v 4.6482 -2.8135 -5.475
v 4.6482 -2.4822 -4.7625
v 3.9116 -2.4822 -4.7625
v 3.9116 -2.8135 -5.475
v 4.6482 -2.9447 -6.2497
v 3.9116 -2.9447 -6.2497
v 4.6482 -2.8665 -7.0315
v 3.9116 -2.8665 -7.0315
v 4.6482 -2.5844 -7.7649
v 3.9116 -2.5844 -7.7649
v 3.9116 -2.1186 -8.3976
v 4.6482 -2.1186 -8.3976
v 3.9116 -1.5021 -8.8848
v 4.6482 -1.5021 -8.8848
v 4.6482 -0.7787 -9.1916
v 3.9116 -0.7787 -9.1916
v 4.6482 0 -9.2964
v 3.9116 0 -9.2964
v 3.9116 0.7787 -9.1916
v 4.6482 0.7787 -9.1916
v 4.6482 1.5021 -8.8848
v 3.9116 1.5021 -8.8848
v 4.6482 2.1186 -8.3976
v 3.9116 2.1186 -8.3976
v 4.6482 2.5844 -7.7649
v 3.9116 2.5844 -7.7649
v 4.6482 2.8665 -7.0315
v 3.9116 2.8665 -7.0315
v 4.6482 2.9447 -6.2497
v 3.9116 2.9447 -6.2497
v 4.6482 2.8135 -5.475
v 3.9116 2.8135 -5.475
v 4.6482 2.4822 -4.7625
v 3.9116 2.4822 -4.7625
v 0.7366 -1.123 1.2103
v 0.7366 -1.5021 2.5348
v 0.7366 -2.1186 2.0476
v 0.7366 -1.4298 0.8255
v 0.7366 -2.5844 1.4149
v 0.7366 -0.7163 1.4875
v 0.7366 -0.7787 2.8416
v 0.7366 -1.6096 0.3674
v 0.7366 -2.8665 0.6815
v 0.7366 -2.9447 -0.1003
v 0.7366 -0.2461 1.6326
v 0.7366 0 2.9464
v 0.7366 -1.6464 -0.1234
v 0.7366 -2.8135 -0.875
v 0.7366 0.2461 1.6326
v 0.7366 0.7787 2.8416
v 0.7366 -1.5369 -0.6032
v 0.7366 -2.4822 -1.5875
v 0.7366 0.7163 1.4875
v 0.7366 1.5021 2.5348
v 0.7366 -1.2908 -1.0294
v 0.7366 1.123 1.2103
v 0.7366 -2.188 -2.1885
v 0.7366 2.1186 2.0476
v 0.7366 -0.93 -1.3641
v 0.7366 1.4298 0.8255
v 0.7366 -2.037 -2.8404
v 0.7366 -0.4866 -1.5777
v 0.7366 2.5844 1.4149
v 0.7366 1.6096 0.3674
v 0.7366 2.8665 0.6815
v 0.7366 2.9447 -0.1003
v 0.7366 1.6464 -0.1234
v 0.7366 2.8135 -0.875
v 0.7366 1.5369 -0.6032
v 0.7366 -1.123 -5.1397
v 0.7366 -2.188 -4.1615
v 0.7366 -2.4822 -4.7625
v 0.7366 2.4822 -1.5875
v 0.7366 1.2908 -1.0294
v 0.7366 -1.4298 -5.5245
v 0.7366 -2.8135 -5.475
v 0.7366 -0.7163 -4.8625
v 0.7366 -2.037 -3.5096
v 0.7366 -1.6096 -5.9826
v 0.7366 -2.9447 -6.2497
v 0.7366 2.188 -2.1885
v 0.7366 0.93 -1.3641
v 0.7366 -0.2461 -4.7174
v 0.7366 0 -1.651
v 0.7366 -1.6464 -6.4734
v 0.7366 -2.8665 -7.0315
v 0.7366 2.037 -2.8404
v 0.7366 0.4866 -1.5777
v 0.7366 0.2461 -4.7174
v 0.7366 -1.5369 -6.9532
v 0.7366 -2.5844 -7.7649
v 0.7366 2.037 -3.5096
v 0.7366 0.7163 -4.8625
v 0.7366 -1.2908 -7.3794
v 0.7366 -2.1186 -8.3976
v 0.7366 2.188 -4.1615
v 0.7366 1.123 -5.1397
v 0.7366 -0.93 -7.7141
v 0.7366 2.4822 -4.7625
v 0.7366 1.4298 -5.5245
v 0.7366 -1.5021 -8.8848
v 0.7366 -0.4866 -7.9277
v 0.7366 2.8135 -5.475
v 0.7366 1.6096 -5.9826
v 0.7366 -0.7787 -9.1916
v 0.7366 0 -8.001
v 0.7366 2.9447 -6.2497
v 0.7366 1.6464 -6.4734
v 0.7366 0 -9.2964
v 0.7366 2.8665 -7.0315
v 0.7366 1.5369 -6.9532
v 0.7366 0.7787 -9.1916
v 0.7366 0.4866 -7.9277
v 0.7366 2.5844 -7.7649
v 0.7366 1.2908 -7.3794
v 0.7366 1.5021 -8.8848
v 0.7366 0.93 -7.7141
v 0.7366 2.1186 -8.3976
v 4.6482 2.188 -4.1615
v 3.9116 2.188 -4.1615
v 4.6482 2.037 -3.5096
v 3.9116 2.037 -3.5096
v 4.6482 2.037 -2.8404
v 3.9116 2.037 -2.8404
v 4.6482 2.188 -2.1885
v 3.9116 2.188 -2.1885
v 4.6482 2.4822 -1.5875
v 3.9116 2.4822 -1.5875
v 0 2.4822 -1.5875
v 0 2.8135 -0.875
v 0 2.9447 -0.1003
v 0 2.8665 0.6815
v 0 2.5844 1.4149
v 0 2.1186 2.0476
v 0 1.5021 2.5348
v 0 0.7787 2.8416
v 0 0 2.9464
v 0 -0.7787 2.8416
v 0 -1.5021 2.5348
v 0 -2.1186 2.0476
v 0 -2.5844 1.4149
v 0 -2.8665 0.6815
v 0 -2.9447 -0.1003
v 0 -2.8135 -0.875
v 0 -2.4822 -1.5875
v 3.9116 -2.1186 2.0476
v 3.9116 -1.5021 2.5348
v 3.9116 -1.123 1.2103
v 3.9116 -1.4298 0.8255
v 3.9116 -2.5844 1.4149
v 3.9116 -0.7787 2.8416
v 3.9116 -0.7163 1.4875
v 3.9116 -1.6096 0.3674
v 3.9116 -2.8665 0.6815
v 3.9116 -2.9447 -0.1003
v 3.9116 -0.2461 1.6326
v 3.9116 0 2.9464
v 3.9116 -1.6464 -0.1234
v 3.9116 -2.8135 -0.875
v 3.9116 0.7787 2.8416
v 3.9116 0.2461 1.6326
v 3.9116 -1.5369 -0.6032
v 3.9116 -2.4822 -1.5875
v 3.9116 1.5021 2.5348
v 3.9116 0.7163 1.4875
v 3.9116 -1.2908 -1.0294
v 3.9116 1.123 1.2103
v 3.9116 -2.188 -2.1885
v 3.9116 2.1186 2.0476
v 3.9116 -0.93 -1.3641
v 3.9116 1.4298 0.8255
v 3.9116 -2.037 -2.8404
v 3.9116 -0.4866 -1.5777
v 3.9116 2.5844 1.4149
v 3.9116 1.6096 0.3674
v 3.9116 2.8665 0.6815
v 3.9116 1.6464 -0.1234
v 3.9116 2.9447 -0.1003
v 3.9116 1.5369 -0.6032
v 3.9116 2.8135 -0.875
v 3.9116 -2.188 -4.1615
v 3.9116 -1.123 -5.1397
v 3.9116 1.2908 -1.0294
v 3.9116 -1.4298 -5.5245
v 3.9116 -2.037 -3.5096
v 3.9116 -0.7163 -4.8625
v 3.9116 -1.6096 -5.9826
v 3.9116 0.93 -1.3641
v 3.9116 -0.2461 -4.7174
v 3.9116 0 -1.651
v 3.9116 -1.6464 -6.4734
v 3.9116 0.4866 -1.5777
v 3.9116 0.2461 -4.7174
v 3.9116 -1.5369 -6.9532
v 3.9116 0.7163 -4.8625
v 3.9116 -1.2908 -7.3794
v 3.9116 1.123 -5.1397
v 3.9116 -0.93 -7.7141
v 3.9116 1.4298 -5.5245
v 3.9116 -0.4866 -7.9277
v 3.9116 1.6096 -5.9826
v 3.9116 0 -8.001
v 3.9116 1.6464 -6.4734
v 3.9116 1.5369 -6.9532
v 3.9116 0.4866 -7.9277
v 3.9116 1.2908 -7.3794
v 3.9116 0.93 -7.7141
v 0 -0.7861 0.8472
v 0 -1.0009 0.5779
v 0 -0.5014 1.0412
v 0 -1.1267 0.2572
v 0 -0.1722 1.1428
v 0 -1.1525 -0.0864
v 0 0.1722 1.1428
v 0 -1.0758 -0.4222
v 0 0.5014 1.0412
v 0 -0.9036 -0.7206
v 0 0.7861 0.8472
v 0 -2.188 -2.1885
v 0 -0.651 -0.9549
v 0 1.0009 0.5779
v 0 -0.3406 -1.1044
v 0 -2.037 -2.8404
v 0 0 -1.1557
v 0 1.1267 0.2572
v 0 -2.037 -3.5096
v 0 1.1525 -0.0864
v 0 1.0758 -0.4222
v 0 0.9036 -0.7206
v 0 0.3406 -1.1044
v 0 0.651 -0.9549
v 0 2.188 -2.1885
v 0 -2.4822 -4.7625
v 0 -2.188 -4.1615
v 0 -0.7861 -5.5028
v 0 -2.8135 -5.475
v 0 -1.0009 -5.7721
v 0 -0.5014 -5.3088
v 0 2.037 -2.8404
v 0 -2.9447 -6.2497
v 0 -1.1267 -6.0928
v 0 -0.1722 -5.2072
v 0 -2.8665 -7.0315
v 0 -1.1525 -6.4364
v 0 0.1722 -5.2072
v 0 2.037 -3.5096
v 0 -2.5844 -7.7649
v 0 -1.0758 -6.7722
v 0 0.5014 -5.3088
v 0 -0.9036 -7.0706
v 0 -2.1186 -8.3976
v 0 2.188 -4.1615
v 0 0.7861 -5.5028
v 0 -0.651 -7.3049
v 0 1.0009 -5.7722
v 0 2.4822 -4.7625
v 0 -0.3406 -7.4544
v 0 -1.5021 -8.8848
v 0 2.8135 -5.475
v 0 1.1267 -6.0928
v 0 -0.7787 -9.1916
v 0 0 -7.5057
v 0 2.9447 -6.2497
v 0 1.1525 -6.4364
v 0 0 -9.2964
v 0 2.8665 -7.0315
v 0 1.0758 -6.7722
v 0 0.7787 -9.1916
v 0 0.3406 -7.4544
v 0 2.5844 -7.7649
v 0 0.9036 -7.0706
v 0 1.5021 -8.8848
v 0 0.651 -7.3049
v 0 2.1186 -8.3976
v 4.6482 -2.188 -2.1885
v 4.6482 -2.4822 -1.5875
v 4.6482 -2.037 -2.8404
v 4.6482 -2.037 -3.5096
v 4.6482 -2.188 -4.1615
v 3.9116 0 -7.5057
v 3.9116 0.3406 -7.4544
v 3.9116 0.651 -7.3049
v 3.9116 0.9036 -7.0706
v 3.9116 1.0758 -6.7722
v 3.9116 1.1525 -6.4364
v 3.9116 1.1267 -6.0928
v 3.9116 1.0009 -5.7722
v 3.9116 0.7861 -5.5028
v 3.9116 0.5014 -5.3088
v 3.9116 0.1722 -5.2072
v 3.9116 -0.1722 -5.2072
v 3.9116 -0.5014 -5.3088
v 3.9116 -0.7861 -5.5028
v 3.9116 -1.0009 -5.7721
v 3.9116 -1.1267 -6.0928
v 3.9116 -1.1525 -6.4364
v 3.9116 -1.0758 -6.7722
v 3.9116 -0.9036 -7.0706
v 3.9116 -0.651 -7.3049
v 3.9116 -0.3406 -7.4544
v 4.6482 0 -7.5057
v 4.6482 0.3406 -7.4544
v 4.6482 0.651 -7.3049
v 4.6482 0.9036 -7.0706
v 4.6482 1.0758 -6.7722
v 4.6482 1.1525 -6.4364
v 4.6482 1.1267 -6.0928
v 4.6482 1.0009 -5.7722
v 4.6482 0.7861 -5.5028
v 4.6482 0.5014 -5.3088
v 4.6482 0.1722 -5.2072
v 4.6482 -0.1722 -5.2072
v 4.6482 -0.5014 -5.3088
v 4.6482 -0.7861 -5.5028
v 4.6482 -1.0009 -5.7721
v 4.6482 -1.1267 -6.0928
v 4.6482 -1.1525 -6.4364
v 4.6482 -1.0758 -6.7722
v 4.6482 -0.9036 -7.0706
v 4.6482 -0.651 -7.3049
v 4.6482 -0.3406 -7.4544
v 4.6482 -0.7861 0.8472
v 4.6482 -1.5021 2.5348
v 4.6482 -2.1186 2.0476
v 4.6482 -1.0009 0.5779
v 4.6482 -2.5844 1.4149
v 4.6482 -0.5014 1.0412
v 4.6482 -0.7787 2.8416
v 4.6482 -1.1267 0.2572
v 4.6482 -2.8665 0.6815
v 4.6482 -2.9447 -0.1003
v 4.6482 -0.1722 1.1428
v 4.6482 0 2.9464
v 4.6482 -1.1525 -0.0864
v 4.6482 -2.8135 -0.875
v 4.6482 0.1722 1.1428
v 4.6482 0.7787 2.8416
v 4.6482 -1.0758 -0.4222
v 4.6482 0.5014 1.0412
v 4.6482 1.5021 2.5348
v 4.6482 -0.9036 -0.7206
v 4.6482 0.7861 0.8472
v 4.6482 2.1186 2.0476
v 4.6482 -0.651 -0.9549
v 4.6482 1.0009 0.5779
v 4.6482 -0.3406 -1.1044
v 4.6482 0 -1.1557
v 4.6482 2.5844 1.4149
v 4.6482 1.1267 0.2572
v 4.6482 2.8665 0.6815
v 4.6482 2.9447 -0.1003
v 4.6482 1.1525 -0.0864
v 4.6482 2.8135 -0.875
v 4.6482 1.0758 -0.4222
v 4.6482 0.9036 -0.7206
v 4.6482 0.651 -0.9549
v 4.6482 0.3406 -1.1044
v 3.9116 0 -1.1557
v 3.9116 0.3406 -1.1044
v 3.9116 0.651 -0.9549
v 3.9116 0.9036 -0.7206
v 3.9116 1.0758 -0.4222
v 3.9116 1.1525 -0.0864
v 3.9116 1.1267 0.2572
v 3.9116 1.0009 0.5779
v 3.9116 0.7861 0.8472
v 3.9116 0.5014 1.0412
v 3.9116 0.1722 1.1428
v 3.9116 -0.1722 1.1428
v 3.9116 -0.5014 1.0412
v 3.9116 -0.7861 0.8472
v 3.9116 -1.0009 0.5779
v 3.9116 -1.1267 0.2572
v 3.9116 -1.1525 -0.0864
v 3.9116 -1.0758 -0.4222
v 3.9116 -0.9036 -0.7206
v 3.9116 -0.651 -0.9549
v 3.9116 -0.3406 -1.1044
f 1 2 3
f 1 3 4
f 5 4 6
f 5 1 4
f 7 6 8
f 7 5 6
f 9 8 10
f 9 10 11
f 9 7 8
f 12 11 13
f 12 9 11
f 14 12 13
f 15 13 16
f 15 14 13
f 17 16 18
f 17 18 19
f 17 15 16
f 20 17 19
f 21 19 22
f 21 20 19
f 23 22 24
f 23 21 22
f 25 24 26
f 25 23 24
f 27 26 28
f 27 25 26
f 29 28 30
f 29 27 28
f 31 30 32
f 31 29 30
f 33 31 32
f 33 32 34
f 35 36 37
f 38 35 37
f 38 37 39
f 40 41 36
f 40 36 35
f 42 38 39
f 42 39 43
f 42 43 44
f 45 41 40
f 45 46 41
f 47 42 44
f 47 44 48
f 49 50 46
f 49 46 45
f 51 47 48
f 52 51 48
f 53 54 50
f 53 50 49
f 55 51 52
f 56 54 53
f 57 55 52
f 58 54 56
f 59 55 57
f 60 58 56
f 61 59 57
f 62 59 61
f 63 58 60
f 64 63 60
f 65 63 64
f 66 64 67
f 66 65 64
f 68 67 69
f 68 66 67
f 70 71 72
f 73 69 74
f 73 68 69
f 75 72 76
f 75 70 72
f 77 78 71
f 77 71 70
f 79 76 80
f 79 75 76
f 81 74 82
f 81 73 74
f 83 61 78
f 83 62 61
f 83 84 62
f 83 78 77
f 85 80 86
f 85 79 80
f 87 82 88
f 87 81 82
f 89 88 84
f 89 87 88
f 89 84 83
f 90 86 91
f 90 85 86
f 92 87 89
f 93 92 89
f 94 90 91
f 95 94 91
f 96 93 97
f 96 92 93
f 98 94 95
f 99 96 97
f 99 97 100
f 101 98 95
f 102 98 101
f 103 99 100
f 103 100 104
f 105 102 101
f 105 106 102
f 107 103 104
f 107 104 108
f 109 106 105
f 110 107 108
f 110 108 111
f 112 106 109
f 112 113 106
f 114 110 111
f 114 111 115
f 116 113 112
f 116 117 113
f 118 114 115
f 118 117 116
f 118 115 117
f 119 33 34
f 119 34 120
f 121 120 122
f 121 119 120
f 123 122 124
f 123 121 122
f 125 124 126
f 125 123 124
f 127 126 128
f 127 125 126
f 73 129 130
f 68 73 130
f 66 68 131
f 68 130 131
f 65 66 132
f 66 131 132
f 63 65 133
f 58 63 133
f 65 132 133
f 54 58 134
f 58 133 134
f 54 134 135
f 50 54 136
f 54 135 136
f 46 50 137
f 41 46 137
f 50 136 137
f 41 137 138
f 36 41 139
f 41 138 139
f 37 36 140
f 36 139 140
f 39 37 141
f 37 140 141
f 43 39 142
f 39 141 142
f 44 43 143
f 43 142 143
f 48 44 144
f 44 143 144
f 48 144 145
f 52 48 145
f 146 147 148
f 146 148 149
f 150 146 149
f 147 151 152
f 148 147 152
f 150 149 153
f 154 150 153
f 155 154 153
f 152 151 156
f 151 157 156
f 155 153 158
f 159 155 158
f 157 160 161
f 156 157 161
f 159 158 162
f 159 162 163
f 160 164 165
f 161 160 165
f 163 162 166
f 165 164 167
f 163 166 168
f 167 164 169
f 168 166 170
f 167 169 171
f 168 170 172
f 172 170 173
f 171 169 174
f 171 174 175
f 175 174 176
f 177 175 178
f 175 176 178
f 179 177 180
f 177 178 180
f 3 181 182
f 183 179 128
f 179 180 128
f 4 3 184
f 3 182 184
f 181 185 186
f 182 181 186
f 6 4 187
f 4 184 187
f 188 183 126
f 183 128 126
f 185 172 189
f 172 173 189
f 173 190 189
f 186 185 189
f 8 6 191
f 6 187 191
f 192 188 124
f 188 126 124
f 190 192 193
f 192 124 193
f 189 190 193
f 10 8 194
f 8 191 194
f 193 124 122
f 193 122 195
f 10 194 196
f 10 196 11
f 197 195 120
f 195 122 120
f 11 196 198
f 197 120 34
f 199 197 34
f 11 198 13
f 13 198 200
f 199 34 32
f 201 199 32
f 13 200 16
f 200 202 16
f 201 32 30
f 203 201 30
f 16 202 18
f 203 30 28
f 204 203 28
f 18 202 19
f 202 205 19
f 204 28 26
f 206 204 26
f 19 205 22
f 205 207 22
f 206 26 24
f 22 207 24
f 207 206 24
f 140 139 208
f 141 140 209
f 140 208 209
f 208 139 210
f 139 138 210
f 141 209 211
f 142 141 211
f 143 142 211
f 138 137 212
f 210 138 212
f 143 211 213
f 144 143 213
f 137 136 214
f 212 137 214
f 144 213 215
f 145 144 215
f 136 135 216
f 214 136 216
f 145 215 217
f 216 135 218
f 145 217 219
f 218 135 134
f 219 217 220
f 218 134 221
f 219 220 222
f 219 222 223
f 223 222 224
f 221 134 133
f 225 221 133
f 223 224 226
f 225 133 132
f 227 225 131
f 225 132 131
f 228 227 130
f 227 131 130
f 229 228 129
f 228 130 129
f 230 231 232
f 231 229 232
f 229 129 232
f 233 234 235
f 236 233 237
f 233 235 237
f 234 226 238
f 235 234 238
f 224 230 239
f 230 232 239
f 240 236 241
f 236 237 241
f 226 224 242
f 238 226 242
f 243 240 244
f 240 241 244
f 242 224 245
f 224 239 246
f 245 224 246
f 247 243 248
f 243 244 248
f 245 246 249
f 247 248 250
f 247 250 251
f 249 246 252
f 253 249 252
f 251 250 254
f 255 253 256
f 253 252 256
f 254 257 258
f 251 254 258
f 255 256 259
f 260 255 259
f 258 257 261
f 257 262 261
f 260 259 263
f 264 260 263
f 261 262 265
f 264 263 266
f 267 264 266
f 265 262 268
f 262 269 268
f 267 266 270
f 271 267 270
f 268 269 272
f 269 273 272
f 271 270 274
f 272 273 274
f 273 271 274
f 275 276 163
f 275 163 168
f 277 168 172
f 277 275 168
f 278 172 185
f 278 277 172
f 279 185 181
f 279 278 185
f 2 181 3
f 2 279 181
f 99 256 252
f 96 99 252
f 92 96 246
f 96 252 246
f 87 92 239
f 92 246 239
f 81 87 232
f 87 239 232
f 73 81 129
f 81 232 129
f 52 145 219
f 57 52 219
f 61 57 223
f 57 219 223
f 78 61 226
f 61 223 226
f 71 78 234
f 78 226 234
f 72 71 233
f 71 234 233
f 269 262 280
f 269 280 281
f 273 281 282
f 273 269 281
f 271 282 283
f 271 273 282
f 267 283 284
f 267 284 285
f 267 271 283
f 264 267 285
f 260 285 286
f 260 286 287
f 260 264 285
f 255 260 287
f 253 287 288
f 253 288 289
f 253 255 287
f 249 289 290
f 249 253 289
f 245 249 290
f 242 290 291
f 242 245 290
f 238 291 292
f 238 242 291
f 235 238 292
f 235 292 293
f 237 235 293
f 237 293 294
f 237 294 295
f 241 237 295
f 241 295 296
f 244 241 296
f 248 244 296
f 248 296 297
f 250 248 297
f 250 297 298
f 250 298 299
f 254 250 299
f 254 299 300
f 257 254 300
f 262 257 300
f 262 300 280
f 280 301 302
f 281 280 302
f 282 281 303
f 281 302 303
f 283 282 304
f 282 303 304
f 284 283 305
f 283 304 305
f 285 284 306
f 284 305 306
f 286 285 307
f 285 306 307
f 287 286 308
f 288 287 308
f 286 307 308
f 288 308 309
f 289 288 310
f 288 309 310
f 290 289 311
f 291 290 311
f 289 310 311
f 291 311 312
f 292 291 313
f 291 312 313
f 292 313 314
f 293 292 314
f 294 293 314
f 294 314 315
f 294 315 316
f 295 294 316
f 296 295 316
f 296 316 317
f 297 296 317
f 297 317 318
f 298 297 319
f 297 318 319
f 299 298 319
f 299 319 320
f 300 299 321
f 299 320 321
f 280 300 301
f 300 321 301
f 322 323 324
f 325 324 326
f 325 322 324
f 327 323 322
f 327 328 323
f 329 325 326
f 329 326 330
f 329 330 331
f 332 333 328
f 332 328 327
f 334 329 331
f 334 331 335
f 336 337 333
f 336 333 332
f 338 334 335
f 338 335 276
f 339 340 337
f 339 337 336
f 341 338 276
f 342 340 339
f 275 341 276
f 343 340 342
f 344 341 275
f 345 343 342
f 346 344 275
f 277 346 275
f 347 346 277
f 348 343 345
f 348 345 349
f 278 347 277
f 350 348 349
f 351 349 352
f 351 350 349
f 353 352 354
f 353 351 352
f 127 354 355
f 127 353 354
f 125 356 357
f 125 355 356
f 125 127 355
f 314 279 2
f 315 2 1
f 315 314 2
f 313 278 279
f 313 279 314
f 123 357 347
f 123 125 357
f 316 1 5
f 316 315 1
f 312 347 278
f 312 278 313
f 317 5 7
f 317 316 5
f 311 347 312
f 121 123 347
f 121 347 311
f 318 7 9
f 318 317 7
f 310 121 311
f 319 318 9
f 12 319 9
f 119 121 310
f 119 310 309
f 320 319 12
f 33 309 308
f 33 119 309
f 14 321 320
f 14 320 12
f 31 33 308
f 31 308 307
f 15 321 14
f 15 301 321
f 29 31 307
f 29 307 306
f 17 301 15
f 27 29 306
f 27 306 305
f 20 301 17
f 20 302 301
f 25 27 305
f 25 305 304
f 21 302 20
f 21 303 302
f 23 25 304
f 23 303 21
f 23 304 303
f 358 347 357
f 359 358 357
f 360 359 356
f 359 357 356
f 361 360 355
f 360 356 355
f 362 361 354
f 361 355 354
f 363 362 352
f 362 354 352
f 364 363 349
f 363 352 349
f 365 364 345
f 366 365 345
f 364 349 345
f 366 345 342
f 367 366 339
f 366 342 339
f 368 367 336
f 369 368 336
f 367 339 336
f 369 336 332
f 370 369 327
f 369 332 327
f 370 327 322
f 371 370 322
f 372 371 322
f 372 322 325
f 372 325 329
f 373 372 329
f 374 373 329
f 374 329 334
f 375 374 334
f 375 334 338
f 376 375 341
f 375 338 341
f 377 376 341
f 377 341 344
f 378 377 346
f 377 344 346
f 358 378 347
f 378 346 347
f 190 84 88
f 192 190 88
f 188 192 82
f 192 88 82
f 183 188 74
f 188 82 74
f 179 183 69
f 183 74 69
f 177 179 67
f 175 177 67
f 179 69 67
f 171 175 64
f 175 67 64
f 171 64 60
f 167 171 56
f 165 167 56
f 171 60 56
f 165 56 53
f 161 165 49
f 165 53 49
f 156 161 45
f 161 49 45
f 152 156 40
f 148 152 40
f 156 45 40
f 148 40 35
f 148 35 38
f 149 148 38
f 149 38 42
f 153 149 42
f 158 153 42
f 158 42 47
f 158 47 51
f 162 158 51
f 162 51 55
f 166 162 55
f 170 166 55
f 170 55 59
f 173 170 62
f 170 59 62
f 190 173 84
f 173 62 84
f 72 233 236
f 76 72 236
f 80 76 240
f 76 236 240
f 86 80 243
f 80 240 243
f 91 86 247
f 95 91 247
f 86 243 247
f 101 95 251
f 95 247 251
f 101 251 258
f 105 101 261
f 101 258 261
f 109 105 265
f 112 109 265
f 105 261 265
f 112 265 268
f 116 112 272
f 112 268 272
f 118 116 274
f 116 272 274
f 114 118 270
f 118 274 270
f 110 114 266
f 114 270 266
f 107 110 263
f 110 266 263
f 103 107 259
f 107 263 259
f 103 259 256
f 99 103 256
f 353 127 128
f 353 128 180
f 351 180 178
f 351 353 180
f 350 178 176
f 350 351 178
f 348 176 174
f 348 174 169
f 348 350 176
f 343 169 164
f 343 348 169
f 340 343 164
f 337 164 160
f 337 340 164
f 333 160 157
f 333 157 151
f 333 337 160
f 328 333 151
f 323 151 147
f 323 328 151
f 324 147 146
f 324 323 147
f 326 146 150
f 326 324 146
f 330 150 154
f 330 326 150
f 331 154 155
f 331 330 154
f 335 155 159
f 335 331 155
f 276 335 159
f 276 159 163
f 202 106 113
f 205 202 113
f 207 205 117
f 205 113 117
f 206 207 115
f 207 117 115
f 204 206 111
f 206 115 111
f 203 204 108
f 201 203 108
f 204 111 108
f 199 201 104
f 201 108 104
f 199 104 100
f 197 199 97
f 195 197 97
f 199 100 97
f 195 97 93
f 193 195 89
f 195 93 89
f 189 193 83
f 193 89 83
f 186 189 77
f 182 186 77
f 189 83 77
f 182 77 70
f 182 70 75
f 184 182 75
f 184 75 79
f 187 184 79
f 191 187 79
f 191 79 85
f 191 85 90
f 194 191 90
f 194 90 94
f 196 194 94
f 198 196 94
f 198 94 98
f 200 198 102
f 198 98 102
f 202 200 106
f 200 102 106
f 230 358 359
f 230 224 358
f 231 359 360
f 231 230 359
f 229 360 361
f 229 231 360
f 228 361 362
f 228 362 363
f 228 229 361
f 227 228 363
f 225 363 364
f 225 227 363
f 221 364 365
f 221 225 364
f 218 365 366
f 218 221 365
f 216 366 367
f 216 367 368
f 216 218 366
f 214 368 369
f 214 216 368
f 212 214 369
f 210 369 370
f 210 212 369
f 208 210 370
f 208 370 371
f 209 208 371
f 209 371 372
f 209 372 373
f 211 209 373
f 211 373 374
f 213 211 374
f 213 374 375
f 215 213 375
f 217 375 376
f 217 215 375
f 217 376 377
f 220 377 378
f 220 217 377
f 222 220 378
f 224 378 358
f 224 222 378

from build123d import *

# Parameters (mm, degrees)
SKETCH1_R           = 1.1557
BOSS_EXTRUDE1_DEPTH = 0.7366
SKETCH2_R           = 1.651
SKETCH2_R_2         = 1.1557
BOSS_EXTRUDE2_DEPTH = 3.175


with BuildPart() as part:
    # Sketch1 → Boss-Extrude1 (new body)
    with BuildSketch(Plane(origin=(0, 0, 0), x_dir=(0, 0, -1), z_dir=(1, 0, 0))):
        with BuildLine():
            ThreePointArc((1.5875, 2.482159687), (-2.9464, 0), (1.5875, -2.482159687))
            ThreePointArc((1.5875, -2.482159687), (3.175, -2.017919373), (4.7625, -2.482159687))
            ThreePointArc((4.7625, -2.482159687), (9.2964, 0), (4.7625, 2.482159687))
            ThreePointArc((4.7625, 2.482159687), (3.175, 2.017919373), (1.5875, 2.482159687))
        make_face()
        Circle(SKETCH1_R, mode=Mode.SUBTRACT)
        with Locations((6.35, 0)):
            Circle(SKETCH1_R, mode=Mode.SUBTRACT)
    boss_extrude1 = extrude(amount=BOSS_EXTRUDE1_DEPTH)

    # Sketch2 → Boss-Extrude2 (add)
    # profile 1 of 2: a face of its own
    with BuildSketch(Plane(origin=(0.7366, 0, 0), x_dir=(0, 0, -1), z_dir=(1, 0, 0))):
        Circle(SKETCH2_R)
        Circle(SKETCH2_R_2, mode=Mode.SUBTRACT)
    # profile 2 of 2: a face of its own
    with BuildSketch(Plane(origin=(0.7366, 0, 0), x_dir=(0, 0, -1), z_dir=(1, 0, 0))):
        with Locations((6.35, 0)):
            Circle(SKETCH2_R)
        with Locations((6.35, 0)):
            Circle(SKETCH2_R_2, mode=Mode.SUBTRACT)
    extrude(amount=BOSS_EXTRUDE2_DEPTH)

    # Mirror1: Boss-Extrude1 across plane
    add(boss_extrude1.mirror(Plane(origin=(2.3241, 0, 0), x_dir=(0, 0, 1), z_dir=(1, 0, 0))))


solid = part.part
